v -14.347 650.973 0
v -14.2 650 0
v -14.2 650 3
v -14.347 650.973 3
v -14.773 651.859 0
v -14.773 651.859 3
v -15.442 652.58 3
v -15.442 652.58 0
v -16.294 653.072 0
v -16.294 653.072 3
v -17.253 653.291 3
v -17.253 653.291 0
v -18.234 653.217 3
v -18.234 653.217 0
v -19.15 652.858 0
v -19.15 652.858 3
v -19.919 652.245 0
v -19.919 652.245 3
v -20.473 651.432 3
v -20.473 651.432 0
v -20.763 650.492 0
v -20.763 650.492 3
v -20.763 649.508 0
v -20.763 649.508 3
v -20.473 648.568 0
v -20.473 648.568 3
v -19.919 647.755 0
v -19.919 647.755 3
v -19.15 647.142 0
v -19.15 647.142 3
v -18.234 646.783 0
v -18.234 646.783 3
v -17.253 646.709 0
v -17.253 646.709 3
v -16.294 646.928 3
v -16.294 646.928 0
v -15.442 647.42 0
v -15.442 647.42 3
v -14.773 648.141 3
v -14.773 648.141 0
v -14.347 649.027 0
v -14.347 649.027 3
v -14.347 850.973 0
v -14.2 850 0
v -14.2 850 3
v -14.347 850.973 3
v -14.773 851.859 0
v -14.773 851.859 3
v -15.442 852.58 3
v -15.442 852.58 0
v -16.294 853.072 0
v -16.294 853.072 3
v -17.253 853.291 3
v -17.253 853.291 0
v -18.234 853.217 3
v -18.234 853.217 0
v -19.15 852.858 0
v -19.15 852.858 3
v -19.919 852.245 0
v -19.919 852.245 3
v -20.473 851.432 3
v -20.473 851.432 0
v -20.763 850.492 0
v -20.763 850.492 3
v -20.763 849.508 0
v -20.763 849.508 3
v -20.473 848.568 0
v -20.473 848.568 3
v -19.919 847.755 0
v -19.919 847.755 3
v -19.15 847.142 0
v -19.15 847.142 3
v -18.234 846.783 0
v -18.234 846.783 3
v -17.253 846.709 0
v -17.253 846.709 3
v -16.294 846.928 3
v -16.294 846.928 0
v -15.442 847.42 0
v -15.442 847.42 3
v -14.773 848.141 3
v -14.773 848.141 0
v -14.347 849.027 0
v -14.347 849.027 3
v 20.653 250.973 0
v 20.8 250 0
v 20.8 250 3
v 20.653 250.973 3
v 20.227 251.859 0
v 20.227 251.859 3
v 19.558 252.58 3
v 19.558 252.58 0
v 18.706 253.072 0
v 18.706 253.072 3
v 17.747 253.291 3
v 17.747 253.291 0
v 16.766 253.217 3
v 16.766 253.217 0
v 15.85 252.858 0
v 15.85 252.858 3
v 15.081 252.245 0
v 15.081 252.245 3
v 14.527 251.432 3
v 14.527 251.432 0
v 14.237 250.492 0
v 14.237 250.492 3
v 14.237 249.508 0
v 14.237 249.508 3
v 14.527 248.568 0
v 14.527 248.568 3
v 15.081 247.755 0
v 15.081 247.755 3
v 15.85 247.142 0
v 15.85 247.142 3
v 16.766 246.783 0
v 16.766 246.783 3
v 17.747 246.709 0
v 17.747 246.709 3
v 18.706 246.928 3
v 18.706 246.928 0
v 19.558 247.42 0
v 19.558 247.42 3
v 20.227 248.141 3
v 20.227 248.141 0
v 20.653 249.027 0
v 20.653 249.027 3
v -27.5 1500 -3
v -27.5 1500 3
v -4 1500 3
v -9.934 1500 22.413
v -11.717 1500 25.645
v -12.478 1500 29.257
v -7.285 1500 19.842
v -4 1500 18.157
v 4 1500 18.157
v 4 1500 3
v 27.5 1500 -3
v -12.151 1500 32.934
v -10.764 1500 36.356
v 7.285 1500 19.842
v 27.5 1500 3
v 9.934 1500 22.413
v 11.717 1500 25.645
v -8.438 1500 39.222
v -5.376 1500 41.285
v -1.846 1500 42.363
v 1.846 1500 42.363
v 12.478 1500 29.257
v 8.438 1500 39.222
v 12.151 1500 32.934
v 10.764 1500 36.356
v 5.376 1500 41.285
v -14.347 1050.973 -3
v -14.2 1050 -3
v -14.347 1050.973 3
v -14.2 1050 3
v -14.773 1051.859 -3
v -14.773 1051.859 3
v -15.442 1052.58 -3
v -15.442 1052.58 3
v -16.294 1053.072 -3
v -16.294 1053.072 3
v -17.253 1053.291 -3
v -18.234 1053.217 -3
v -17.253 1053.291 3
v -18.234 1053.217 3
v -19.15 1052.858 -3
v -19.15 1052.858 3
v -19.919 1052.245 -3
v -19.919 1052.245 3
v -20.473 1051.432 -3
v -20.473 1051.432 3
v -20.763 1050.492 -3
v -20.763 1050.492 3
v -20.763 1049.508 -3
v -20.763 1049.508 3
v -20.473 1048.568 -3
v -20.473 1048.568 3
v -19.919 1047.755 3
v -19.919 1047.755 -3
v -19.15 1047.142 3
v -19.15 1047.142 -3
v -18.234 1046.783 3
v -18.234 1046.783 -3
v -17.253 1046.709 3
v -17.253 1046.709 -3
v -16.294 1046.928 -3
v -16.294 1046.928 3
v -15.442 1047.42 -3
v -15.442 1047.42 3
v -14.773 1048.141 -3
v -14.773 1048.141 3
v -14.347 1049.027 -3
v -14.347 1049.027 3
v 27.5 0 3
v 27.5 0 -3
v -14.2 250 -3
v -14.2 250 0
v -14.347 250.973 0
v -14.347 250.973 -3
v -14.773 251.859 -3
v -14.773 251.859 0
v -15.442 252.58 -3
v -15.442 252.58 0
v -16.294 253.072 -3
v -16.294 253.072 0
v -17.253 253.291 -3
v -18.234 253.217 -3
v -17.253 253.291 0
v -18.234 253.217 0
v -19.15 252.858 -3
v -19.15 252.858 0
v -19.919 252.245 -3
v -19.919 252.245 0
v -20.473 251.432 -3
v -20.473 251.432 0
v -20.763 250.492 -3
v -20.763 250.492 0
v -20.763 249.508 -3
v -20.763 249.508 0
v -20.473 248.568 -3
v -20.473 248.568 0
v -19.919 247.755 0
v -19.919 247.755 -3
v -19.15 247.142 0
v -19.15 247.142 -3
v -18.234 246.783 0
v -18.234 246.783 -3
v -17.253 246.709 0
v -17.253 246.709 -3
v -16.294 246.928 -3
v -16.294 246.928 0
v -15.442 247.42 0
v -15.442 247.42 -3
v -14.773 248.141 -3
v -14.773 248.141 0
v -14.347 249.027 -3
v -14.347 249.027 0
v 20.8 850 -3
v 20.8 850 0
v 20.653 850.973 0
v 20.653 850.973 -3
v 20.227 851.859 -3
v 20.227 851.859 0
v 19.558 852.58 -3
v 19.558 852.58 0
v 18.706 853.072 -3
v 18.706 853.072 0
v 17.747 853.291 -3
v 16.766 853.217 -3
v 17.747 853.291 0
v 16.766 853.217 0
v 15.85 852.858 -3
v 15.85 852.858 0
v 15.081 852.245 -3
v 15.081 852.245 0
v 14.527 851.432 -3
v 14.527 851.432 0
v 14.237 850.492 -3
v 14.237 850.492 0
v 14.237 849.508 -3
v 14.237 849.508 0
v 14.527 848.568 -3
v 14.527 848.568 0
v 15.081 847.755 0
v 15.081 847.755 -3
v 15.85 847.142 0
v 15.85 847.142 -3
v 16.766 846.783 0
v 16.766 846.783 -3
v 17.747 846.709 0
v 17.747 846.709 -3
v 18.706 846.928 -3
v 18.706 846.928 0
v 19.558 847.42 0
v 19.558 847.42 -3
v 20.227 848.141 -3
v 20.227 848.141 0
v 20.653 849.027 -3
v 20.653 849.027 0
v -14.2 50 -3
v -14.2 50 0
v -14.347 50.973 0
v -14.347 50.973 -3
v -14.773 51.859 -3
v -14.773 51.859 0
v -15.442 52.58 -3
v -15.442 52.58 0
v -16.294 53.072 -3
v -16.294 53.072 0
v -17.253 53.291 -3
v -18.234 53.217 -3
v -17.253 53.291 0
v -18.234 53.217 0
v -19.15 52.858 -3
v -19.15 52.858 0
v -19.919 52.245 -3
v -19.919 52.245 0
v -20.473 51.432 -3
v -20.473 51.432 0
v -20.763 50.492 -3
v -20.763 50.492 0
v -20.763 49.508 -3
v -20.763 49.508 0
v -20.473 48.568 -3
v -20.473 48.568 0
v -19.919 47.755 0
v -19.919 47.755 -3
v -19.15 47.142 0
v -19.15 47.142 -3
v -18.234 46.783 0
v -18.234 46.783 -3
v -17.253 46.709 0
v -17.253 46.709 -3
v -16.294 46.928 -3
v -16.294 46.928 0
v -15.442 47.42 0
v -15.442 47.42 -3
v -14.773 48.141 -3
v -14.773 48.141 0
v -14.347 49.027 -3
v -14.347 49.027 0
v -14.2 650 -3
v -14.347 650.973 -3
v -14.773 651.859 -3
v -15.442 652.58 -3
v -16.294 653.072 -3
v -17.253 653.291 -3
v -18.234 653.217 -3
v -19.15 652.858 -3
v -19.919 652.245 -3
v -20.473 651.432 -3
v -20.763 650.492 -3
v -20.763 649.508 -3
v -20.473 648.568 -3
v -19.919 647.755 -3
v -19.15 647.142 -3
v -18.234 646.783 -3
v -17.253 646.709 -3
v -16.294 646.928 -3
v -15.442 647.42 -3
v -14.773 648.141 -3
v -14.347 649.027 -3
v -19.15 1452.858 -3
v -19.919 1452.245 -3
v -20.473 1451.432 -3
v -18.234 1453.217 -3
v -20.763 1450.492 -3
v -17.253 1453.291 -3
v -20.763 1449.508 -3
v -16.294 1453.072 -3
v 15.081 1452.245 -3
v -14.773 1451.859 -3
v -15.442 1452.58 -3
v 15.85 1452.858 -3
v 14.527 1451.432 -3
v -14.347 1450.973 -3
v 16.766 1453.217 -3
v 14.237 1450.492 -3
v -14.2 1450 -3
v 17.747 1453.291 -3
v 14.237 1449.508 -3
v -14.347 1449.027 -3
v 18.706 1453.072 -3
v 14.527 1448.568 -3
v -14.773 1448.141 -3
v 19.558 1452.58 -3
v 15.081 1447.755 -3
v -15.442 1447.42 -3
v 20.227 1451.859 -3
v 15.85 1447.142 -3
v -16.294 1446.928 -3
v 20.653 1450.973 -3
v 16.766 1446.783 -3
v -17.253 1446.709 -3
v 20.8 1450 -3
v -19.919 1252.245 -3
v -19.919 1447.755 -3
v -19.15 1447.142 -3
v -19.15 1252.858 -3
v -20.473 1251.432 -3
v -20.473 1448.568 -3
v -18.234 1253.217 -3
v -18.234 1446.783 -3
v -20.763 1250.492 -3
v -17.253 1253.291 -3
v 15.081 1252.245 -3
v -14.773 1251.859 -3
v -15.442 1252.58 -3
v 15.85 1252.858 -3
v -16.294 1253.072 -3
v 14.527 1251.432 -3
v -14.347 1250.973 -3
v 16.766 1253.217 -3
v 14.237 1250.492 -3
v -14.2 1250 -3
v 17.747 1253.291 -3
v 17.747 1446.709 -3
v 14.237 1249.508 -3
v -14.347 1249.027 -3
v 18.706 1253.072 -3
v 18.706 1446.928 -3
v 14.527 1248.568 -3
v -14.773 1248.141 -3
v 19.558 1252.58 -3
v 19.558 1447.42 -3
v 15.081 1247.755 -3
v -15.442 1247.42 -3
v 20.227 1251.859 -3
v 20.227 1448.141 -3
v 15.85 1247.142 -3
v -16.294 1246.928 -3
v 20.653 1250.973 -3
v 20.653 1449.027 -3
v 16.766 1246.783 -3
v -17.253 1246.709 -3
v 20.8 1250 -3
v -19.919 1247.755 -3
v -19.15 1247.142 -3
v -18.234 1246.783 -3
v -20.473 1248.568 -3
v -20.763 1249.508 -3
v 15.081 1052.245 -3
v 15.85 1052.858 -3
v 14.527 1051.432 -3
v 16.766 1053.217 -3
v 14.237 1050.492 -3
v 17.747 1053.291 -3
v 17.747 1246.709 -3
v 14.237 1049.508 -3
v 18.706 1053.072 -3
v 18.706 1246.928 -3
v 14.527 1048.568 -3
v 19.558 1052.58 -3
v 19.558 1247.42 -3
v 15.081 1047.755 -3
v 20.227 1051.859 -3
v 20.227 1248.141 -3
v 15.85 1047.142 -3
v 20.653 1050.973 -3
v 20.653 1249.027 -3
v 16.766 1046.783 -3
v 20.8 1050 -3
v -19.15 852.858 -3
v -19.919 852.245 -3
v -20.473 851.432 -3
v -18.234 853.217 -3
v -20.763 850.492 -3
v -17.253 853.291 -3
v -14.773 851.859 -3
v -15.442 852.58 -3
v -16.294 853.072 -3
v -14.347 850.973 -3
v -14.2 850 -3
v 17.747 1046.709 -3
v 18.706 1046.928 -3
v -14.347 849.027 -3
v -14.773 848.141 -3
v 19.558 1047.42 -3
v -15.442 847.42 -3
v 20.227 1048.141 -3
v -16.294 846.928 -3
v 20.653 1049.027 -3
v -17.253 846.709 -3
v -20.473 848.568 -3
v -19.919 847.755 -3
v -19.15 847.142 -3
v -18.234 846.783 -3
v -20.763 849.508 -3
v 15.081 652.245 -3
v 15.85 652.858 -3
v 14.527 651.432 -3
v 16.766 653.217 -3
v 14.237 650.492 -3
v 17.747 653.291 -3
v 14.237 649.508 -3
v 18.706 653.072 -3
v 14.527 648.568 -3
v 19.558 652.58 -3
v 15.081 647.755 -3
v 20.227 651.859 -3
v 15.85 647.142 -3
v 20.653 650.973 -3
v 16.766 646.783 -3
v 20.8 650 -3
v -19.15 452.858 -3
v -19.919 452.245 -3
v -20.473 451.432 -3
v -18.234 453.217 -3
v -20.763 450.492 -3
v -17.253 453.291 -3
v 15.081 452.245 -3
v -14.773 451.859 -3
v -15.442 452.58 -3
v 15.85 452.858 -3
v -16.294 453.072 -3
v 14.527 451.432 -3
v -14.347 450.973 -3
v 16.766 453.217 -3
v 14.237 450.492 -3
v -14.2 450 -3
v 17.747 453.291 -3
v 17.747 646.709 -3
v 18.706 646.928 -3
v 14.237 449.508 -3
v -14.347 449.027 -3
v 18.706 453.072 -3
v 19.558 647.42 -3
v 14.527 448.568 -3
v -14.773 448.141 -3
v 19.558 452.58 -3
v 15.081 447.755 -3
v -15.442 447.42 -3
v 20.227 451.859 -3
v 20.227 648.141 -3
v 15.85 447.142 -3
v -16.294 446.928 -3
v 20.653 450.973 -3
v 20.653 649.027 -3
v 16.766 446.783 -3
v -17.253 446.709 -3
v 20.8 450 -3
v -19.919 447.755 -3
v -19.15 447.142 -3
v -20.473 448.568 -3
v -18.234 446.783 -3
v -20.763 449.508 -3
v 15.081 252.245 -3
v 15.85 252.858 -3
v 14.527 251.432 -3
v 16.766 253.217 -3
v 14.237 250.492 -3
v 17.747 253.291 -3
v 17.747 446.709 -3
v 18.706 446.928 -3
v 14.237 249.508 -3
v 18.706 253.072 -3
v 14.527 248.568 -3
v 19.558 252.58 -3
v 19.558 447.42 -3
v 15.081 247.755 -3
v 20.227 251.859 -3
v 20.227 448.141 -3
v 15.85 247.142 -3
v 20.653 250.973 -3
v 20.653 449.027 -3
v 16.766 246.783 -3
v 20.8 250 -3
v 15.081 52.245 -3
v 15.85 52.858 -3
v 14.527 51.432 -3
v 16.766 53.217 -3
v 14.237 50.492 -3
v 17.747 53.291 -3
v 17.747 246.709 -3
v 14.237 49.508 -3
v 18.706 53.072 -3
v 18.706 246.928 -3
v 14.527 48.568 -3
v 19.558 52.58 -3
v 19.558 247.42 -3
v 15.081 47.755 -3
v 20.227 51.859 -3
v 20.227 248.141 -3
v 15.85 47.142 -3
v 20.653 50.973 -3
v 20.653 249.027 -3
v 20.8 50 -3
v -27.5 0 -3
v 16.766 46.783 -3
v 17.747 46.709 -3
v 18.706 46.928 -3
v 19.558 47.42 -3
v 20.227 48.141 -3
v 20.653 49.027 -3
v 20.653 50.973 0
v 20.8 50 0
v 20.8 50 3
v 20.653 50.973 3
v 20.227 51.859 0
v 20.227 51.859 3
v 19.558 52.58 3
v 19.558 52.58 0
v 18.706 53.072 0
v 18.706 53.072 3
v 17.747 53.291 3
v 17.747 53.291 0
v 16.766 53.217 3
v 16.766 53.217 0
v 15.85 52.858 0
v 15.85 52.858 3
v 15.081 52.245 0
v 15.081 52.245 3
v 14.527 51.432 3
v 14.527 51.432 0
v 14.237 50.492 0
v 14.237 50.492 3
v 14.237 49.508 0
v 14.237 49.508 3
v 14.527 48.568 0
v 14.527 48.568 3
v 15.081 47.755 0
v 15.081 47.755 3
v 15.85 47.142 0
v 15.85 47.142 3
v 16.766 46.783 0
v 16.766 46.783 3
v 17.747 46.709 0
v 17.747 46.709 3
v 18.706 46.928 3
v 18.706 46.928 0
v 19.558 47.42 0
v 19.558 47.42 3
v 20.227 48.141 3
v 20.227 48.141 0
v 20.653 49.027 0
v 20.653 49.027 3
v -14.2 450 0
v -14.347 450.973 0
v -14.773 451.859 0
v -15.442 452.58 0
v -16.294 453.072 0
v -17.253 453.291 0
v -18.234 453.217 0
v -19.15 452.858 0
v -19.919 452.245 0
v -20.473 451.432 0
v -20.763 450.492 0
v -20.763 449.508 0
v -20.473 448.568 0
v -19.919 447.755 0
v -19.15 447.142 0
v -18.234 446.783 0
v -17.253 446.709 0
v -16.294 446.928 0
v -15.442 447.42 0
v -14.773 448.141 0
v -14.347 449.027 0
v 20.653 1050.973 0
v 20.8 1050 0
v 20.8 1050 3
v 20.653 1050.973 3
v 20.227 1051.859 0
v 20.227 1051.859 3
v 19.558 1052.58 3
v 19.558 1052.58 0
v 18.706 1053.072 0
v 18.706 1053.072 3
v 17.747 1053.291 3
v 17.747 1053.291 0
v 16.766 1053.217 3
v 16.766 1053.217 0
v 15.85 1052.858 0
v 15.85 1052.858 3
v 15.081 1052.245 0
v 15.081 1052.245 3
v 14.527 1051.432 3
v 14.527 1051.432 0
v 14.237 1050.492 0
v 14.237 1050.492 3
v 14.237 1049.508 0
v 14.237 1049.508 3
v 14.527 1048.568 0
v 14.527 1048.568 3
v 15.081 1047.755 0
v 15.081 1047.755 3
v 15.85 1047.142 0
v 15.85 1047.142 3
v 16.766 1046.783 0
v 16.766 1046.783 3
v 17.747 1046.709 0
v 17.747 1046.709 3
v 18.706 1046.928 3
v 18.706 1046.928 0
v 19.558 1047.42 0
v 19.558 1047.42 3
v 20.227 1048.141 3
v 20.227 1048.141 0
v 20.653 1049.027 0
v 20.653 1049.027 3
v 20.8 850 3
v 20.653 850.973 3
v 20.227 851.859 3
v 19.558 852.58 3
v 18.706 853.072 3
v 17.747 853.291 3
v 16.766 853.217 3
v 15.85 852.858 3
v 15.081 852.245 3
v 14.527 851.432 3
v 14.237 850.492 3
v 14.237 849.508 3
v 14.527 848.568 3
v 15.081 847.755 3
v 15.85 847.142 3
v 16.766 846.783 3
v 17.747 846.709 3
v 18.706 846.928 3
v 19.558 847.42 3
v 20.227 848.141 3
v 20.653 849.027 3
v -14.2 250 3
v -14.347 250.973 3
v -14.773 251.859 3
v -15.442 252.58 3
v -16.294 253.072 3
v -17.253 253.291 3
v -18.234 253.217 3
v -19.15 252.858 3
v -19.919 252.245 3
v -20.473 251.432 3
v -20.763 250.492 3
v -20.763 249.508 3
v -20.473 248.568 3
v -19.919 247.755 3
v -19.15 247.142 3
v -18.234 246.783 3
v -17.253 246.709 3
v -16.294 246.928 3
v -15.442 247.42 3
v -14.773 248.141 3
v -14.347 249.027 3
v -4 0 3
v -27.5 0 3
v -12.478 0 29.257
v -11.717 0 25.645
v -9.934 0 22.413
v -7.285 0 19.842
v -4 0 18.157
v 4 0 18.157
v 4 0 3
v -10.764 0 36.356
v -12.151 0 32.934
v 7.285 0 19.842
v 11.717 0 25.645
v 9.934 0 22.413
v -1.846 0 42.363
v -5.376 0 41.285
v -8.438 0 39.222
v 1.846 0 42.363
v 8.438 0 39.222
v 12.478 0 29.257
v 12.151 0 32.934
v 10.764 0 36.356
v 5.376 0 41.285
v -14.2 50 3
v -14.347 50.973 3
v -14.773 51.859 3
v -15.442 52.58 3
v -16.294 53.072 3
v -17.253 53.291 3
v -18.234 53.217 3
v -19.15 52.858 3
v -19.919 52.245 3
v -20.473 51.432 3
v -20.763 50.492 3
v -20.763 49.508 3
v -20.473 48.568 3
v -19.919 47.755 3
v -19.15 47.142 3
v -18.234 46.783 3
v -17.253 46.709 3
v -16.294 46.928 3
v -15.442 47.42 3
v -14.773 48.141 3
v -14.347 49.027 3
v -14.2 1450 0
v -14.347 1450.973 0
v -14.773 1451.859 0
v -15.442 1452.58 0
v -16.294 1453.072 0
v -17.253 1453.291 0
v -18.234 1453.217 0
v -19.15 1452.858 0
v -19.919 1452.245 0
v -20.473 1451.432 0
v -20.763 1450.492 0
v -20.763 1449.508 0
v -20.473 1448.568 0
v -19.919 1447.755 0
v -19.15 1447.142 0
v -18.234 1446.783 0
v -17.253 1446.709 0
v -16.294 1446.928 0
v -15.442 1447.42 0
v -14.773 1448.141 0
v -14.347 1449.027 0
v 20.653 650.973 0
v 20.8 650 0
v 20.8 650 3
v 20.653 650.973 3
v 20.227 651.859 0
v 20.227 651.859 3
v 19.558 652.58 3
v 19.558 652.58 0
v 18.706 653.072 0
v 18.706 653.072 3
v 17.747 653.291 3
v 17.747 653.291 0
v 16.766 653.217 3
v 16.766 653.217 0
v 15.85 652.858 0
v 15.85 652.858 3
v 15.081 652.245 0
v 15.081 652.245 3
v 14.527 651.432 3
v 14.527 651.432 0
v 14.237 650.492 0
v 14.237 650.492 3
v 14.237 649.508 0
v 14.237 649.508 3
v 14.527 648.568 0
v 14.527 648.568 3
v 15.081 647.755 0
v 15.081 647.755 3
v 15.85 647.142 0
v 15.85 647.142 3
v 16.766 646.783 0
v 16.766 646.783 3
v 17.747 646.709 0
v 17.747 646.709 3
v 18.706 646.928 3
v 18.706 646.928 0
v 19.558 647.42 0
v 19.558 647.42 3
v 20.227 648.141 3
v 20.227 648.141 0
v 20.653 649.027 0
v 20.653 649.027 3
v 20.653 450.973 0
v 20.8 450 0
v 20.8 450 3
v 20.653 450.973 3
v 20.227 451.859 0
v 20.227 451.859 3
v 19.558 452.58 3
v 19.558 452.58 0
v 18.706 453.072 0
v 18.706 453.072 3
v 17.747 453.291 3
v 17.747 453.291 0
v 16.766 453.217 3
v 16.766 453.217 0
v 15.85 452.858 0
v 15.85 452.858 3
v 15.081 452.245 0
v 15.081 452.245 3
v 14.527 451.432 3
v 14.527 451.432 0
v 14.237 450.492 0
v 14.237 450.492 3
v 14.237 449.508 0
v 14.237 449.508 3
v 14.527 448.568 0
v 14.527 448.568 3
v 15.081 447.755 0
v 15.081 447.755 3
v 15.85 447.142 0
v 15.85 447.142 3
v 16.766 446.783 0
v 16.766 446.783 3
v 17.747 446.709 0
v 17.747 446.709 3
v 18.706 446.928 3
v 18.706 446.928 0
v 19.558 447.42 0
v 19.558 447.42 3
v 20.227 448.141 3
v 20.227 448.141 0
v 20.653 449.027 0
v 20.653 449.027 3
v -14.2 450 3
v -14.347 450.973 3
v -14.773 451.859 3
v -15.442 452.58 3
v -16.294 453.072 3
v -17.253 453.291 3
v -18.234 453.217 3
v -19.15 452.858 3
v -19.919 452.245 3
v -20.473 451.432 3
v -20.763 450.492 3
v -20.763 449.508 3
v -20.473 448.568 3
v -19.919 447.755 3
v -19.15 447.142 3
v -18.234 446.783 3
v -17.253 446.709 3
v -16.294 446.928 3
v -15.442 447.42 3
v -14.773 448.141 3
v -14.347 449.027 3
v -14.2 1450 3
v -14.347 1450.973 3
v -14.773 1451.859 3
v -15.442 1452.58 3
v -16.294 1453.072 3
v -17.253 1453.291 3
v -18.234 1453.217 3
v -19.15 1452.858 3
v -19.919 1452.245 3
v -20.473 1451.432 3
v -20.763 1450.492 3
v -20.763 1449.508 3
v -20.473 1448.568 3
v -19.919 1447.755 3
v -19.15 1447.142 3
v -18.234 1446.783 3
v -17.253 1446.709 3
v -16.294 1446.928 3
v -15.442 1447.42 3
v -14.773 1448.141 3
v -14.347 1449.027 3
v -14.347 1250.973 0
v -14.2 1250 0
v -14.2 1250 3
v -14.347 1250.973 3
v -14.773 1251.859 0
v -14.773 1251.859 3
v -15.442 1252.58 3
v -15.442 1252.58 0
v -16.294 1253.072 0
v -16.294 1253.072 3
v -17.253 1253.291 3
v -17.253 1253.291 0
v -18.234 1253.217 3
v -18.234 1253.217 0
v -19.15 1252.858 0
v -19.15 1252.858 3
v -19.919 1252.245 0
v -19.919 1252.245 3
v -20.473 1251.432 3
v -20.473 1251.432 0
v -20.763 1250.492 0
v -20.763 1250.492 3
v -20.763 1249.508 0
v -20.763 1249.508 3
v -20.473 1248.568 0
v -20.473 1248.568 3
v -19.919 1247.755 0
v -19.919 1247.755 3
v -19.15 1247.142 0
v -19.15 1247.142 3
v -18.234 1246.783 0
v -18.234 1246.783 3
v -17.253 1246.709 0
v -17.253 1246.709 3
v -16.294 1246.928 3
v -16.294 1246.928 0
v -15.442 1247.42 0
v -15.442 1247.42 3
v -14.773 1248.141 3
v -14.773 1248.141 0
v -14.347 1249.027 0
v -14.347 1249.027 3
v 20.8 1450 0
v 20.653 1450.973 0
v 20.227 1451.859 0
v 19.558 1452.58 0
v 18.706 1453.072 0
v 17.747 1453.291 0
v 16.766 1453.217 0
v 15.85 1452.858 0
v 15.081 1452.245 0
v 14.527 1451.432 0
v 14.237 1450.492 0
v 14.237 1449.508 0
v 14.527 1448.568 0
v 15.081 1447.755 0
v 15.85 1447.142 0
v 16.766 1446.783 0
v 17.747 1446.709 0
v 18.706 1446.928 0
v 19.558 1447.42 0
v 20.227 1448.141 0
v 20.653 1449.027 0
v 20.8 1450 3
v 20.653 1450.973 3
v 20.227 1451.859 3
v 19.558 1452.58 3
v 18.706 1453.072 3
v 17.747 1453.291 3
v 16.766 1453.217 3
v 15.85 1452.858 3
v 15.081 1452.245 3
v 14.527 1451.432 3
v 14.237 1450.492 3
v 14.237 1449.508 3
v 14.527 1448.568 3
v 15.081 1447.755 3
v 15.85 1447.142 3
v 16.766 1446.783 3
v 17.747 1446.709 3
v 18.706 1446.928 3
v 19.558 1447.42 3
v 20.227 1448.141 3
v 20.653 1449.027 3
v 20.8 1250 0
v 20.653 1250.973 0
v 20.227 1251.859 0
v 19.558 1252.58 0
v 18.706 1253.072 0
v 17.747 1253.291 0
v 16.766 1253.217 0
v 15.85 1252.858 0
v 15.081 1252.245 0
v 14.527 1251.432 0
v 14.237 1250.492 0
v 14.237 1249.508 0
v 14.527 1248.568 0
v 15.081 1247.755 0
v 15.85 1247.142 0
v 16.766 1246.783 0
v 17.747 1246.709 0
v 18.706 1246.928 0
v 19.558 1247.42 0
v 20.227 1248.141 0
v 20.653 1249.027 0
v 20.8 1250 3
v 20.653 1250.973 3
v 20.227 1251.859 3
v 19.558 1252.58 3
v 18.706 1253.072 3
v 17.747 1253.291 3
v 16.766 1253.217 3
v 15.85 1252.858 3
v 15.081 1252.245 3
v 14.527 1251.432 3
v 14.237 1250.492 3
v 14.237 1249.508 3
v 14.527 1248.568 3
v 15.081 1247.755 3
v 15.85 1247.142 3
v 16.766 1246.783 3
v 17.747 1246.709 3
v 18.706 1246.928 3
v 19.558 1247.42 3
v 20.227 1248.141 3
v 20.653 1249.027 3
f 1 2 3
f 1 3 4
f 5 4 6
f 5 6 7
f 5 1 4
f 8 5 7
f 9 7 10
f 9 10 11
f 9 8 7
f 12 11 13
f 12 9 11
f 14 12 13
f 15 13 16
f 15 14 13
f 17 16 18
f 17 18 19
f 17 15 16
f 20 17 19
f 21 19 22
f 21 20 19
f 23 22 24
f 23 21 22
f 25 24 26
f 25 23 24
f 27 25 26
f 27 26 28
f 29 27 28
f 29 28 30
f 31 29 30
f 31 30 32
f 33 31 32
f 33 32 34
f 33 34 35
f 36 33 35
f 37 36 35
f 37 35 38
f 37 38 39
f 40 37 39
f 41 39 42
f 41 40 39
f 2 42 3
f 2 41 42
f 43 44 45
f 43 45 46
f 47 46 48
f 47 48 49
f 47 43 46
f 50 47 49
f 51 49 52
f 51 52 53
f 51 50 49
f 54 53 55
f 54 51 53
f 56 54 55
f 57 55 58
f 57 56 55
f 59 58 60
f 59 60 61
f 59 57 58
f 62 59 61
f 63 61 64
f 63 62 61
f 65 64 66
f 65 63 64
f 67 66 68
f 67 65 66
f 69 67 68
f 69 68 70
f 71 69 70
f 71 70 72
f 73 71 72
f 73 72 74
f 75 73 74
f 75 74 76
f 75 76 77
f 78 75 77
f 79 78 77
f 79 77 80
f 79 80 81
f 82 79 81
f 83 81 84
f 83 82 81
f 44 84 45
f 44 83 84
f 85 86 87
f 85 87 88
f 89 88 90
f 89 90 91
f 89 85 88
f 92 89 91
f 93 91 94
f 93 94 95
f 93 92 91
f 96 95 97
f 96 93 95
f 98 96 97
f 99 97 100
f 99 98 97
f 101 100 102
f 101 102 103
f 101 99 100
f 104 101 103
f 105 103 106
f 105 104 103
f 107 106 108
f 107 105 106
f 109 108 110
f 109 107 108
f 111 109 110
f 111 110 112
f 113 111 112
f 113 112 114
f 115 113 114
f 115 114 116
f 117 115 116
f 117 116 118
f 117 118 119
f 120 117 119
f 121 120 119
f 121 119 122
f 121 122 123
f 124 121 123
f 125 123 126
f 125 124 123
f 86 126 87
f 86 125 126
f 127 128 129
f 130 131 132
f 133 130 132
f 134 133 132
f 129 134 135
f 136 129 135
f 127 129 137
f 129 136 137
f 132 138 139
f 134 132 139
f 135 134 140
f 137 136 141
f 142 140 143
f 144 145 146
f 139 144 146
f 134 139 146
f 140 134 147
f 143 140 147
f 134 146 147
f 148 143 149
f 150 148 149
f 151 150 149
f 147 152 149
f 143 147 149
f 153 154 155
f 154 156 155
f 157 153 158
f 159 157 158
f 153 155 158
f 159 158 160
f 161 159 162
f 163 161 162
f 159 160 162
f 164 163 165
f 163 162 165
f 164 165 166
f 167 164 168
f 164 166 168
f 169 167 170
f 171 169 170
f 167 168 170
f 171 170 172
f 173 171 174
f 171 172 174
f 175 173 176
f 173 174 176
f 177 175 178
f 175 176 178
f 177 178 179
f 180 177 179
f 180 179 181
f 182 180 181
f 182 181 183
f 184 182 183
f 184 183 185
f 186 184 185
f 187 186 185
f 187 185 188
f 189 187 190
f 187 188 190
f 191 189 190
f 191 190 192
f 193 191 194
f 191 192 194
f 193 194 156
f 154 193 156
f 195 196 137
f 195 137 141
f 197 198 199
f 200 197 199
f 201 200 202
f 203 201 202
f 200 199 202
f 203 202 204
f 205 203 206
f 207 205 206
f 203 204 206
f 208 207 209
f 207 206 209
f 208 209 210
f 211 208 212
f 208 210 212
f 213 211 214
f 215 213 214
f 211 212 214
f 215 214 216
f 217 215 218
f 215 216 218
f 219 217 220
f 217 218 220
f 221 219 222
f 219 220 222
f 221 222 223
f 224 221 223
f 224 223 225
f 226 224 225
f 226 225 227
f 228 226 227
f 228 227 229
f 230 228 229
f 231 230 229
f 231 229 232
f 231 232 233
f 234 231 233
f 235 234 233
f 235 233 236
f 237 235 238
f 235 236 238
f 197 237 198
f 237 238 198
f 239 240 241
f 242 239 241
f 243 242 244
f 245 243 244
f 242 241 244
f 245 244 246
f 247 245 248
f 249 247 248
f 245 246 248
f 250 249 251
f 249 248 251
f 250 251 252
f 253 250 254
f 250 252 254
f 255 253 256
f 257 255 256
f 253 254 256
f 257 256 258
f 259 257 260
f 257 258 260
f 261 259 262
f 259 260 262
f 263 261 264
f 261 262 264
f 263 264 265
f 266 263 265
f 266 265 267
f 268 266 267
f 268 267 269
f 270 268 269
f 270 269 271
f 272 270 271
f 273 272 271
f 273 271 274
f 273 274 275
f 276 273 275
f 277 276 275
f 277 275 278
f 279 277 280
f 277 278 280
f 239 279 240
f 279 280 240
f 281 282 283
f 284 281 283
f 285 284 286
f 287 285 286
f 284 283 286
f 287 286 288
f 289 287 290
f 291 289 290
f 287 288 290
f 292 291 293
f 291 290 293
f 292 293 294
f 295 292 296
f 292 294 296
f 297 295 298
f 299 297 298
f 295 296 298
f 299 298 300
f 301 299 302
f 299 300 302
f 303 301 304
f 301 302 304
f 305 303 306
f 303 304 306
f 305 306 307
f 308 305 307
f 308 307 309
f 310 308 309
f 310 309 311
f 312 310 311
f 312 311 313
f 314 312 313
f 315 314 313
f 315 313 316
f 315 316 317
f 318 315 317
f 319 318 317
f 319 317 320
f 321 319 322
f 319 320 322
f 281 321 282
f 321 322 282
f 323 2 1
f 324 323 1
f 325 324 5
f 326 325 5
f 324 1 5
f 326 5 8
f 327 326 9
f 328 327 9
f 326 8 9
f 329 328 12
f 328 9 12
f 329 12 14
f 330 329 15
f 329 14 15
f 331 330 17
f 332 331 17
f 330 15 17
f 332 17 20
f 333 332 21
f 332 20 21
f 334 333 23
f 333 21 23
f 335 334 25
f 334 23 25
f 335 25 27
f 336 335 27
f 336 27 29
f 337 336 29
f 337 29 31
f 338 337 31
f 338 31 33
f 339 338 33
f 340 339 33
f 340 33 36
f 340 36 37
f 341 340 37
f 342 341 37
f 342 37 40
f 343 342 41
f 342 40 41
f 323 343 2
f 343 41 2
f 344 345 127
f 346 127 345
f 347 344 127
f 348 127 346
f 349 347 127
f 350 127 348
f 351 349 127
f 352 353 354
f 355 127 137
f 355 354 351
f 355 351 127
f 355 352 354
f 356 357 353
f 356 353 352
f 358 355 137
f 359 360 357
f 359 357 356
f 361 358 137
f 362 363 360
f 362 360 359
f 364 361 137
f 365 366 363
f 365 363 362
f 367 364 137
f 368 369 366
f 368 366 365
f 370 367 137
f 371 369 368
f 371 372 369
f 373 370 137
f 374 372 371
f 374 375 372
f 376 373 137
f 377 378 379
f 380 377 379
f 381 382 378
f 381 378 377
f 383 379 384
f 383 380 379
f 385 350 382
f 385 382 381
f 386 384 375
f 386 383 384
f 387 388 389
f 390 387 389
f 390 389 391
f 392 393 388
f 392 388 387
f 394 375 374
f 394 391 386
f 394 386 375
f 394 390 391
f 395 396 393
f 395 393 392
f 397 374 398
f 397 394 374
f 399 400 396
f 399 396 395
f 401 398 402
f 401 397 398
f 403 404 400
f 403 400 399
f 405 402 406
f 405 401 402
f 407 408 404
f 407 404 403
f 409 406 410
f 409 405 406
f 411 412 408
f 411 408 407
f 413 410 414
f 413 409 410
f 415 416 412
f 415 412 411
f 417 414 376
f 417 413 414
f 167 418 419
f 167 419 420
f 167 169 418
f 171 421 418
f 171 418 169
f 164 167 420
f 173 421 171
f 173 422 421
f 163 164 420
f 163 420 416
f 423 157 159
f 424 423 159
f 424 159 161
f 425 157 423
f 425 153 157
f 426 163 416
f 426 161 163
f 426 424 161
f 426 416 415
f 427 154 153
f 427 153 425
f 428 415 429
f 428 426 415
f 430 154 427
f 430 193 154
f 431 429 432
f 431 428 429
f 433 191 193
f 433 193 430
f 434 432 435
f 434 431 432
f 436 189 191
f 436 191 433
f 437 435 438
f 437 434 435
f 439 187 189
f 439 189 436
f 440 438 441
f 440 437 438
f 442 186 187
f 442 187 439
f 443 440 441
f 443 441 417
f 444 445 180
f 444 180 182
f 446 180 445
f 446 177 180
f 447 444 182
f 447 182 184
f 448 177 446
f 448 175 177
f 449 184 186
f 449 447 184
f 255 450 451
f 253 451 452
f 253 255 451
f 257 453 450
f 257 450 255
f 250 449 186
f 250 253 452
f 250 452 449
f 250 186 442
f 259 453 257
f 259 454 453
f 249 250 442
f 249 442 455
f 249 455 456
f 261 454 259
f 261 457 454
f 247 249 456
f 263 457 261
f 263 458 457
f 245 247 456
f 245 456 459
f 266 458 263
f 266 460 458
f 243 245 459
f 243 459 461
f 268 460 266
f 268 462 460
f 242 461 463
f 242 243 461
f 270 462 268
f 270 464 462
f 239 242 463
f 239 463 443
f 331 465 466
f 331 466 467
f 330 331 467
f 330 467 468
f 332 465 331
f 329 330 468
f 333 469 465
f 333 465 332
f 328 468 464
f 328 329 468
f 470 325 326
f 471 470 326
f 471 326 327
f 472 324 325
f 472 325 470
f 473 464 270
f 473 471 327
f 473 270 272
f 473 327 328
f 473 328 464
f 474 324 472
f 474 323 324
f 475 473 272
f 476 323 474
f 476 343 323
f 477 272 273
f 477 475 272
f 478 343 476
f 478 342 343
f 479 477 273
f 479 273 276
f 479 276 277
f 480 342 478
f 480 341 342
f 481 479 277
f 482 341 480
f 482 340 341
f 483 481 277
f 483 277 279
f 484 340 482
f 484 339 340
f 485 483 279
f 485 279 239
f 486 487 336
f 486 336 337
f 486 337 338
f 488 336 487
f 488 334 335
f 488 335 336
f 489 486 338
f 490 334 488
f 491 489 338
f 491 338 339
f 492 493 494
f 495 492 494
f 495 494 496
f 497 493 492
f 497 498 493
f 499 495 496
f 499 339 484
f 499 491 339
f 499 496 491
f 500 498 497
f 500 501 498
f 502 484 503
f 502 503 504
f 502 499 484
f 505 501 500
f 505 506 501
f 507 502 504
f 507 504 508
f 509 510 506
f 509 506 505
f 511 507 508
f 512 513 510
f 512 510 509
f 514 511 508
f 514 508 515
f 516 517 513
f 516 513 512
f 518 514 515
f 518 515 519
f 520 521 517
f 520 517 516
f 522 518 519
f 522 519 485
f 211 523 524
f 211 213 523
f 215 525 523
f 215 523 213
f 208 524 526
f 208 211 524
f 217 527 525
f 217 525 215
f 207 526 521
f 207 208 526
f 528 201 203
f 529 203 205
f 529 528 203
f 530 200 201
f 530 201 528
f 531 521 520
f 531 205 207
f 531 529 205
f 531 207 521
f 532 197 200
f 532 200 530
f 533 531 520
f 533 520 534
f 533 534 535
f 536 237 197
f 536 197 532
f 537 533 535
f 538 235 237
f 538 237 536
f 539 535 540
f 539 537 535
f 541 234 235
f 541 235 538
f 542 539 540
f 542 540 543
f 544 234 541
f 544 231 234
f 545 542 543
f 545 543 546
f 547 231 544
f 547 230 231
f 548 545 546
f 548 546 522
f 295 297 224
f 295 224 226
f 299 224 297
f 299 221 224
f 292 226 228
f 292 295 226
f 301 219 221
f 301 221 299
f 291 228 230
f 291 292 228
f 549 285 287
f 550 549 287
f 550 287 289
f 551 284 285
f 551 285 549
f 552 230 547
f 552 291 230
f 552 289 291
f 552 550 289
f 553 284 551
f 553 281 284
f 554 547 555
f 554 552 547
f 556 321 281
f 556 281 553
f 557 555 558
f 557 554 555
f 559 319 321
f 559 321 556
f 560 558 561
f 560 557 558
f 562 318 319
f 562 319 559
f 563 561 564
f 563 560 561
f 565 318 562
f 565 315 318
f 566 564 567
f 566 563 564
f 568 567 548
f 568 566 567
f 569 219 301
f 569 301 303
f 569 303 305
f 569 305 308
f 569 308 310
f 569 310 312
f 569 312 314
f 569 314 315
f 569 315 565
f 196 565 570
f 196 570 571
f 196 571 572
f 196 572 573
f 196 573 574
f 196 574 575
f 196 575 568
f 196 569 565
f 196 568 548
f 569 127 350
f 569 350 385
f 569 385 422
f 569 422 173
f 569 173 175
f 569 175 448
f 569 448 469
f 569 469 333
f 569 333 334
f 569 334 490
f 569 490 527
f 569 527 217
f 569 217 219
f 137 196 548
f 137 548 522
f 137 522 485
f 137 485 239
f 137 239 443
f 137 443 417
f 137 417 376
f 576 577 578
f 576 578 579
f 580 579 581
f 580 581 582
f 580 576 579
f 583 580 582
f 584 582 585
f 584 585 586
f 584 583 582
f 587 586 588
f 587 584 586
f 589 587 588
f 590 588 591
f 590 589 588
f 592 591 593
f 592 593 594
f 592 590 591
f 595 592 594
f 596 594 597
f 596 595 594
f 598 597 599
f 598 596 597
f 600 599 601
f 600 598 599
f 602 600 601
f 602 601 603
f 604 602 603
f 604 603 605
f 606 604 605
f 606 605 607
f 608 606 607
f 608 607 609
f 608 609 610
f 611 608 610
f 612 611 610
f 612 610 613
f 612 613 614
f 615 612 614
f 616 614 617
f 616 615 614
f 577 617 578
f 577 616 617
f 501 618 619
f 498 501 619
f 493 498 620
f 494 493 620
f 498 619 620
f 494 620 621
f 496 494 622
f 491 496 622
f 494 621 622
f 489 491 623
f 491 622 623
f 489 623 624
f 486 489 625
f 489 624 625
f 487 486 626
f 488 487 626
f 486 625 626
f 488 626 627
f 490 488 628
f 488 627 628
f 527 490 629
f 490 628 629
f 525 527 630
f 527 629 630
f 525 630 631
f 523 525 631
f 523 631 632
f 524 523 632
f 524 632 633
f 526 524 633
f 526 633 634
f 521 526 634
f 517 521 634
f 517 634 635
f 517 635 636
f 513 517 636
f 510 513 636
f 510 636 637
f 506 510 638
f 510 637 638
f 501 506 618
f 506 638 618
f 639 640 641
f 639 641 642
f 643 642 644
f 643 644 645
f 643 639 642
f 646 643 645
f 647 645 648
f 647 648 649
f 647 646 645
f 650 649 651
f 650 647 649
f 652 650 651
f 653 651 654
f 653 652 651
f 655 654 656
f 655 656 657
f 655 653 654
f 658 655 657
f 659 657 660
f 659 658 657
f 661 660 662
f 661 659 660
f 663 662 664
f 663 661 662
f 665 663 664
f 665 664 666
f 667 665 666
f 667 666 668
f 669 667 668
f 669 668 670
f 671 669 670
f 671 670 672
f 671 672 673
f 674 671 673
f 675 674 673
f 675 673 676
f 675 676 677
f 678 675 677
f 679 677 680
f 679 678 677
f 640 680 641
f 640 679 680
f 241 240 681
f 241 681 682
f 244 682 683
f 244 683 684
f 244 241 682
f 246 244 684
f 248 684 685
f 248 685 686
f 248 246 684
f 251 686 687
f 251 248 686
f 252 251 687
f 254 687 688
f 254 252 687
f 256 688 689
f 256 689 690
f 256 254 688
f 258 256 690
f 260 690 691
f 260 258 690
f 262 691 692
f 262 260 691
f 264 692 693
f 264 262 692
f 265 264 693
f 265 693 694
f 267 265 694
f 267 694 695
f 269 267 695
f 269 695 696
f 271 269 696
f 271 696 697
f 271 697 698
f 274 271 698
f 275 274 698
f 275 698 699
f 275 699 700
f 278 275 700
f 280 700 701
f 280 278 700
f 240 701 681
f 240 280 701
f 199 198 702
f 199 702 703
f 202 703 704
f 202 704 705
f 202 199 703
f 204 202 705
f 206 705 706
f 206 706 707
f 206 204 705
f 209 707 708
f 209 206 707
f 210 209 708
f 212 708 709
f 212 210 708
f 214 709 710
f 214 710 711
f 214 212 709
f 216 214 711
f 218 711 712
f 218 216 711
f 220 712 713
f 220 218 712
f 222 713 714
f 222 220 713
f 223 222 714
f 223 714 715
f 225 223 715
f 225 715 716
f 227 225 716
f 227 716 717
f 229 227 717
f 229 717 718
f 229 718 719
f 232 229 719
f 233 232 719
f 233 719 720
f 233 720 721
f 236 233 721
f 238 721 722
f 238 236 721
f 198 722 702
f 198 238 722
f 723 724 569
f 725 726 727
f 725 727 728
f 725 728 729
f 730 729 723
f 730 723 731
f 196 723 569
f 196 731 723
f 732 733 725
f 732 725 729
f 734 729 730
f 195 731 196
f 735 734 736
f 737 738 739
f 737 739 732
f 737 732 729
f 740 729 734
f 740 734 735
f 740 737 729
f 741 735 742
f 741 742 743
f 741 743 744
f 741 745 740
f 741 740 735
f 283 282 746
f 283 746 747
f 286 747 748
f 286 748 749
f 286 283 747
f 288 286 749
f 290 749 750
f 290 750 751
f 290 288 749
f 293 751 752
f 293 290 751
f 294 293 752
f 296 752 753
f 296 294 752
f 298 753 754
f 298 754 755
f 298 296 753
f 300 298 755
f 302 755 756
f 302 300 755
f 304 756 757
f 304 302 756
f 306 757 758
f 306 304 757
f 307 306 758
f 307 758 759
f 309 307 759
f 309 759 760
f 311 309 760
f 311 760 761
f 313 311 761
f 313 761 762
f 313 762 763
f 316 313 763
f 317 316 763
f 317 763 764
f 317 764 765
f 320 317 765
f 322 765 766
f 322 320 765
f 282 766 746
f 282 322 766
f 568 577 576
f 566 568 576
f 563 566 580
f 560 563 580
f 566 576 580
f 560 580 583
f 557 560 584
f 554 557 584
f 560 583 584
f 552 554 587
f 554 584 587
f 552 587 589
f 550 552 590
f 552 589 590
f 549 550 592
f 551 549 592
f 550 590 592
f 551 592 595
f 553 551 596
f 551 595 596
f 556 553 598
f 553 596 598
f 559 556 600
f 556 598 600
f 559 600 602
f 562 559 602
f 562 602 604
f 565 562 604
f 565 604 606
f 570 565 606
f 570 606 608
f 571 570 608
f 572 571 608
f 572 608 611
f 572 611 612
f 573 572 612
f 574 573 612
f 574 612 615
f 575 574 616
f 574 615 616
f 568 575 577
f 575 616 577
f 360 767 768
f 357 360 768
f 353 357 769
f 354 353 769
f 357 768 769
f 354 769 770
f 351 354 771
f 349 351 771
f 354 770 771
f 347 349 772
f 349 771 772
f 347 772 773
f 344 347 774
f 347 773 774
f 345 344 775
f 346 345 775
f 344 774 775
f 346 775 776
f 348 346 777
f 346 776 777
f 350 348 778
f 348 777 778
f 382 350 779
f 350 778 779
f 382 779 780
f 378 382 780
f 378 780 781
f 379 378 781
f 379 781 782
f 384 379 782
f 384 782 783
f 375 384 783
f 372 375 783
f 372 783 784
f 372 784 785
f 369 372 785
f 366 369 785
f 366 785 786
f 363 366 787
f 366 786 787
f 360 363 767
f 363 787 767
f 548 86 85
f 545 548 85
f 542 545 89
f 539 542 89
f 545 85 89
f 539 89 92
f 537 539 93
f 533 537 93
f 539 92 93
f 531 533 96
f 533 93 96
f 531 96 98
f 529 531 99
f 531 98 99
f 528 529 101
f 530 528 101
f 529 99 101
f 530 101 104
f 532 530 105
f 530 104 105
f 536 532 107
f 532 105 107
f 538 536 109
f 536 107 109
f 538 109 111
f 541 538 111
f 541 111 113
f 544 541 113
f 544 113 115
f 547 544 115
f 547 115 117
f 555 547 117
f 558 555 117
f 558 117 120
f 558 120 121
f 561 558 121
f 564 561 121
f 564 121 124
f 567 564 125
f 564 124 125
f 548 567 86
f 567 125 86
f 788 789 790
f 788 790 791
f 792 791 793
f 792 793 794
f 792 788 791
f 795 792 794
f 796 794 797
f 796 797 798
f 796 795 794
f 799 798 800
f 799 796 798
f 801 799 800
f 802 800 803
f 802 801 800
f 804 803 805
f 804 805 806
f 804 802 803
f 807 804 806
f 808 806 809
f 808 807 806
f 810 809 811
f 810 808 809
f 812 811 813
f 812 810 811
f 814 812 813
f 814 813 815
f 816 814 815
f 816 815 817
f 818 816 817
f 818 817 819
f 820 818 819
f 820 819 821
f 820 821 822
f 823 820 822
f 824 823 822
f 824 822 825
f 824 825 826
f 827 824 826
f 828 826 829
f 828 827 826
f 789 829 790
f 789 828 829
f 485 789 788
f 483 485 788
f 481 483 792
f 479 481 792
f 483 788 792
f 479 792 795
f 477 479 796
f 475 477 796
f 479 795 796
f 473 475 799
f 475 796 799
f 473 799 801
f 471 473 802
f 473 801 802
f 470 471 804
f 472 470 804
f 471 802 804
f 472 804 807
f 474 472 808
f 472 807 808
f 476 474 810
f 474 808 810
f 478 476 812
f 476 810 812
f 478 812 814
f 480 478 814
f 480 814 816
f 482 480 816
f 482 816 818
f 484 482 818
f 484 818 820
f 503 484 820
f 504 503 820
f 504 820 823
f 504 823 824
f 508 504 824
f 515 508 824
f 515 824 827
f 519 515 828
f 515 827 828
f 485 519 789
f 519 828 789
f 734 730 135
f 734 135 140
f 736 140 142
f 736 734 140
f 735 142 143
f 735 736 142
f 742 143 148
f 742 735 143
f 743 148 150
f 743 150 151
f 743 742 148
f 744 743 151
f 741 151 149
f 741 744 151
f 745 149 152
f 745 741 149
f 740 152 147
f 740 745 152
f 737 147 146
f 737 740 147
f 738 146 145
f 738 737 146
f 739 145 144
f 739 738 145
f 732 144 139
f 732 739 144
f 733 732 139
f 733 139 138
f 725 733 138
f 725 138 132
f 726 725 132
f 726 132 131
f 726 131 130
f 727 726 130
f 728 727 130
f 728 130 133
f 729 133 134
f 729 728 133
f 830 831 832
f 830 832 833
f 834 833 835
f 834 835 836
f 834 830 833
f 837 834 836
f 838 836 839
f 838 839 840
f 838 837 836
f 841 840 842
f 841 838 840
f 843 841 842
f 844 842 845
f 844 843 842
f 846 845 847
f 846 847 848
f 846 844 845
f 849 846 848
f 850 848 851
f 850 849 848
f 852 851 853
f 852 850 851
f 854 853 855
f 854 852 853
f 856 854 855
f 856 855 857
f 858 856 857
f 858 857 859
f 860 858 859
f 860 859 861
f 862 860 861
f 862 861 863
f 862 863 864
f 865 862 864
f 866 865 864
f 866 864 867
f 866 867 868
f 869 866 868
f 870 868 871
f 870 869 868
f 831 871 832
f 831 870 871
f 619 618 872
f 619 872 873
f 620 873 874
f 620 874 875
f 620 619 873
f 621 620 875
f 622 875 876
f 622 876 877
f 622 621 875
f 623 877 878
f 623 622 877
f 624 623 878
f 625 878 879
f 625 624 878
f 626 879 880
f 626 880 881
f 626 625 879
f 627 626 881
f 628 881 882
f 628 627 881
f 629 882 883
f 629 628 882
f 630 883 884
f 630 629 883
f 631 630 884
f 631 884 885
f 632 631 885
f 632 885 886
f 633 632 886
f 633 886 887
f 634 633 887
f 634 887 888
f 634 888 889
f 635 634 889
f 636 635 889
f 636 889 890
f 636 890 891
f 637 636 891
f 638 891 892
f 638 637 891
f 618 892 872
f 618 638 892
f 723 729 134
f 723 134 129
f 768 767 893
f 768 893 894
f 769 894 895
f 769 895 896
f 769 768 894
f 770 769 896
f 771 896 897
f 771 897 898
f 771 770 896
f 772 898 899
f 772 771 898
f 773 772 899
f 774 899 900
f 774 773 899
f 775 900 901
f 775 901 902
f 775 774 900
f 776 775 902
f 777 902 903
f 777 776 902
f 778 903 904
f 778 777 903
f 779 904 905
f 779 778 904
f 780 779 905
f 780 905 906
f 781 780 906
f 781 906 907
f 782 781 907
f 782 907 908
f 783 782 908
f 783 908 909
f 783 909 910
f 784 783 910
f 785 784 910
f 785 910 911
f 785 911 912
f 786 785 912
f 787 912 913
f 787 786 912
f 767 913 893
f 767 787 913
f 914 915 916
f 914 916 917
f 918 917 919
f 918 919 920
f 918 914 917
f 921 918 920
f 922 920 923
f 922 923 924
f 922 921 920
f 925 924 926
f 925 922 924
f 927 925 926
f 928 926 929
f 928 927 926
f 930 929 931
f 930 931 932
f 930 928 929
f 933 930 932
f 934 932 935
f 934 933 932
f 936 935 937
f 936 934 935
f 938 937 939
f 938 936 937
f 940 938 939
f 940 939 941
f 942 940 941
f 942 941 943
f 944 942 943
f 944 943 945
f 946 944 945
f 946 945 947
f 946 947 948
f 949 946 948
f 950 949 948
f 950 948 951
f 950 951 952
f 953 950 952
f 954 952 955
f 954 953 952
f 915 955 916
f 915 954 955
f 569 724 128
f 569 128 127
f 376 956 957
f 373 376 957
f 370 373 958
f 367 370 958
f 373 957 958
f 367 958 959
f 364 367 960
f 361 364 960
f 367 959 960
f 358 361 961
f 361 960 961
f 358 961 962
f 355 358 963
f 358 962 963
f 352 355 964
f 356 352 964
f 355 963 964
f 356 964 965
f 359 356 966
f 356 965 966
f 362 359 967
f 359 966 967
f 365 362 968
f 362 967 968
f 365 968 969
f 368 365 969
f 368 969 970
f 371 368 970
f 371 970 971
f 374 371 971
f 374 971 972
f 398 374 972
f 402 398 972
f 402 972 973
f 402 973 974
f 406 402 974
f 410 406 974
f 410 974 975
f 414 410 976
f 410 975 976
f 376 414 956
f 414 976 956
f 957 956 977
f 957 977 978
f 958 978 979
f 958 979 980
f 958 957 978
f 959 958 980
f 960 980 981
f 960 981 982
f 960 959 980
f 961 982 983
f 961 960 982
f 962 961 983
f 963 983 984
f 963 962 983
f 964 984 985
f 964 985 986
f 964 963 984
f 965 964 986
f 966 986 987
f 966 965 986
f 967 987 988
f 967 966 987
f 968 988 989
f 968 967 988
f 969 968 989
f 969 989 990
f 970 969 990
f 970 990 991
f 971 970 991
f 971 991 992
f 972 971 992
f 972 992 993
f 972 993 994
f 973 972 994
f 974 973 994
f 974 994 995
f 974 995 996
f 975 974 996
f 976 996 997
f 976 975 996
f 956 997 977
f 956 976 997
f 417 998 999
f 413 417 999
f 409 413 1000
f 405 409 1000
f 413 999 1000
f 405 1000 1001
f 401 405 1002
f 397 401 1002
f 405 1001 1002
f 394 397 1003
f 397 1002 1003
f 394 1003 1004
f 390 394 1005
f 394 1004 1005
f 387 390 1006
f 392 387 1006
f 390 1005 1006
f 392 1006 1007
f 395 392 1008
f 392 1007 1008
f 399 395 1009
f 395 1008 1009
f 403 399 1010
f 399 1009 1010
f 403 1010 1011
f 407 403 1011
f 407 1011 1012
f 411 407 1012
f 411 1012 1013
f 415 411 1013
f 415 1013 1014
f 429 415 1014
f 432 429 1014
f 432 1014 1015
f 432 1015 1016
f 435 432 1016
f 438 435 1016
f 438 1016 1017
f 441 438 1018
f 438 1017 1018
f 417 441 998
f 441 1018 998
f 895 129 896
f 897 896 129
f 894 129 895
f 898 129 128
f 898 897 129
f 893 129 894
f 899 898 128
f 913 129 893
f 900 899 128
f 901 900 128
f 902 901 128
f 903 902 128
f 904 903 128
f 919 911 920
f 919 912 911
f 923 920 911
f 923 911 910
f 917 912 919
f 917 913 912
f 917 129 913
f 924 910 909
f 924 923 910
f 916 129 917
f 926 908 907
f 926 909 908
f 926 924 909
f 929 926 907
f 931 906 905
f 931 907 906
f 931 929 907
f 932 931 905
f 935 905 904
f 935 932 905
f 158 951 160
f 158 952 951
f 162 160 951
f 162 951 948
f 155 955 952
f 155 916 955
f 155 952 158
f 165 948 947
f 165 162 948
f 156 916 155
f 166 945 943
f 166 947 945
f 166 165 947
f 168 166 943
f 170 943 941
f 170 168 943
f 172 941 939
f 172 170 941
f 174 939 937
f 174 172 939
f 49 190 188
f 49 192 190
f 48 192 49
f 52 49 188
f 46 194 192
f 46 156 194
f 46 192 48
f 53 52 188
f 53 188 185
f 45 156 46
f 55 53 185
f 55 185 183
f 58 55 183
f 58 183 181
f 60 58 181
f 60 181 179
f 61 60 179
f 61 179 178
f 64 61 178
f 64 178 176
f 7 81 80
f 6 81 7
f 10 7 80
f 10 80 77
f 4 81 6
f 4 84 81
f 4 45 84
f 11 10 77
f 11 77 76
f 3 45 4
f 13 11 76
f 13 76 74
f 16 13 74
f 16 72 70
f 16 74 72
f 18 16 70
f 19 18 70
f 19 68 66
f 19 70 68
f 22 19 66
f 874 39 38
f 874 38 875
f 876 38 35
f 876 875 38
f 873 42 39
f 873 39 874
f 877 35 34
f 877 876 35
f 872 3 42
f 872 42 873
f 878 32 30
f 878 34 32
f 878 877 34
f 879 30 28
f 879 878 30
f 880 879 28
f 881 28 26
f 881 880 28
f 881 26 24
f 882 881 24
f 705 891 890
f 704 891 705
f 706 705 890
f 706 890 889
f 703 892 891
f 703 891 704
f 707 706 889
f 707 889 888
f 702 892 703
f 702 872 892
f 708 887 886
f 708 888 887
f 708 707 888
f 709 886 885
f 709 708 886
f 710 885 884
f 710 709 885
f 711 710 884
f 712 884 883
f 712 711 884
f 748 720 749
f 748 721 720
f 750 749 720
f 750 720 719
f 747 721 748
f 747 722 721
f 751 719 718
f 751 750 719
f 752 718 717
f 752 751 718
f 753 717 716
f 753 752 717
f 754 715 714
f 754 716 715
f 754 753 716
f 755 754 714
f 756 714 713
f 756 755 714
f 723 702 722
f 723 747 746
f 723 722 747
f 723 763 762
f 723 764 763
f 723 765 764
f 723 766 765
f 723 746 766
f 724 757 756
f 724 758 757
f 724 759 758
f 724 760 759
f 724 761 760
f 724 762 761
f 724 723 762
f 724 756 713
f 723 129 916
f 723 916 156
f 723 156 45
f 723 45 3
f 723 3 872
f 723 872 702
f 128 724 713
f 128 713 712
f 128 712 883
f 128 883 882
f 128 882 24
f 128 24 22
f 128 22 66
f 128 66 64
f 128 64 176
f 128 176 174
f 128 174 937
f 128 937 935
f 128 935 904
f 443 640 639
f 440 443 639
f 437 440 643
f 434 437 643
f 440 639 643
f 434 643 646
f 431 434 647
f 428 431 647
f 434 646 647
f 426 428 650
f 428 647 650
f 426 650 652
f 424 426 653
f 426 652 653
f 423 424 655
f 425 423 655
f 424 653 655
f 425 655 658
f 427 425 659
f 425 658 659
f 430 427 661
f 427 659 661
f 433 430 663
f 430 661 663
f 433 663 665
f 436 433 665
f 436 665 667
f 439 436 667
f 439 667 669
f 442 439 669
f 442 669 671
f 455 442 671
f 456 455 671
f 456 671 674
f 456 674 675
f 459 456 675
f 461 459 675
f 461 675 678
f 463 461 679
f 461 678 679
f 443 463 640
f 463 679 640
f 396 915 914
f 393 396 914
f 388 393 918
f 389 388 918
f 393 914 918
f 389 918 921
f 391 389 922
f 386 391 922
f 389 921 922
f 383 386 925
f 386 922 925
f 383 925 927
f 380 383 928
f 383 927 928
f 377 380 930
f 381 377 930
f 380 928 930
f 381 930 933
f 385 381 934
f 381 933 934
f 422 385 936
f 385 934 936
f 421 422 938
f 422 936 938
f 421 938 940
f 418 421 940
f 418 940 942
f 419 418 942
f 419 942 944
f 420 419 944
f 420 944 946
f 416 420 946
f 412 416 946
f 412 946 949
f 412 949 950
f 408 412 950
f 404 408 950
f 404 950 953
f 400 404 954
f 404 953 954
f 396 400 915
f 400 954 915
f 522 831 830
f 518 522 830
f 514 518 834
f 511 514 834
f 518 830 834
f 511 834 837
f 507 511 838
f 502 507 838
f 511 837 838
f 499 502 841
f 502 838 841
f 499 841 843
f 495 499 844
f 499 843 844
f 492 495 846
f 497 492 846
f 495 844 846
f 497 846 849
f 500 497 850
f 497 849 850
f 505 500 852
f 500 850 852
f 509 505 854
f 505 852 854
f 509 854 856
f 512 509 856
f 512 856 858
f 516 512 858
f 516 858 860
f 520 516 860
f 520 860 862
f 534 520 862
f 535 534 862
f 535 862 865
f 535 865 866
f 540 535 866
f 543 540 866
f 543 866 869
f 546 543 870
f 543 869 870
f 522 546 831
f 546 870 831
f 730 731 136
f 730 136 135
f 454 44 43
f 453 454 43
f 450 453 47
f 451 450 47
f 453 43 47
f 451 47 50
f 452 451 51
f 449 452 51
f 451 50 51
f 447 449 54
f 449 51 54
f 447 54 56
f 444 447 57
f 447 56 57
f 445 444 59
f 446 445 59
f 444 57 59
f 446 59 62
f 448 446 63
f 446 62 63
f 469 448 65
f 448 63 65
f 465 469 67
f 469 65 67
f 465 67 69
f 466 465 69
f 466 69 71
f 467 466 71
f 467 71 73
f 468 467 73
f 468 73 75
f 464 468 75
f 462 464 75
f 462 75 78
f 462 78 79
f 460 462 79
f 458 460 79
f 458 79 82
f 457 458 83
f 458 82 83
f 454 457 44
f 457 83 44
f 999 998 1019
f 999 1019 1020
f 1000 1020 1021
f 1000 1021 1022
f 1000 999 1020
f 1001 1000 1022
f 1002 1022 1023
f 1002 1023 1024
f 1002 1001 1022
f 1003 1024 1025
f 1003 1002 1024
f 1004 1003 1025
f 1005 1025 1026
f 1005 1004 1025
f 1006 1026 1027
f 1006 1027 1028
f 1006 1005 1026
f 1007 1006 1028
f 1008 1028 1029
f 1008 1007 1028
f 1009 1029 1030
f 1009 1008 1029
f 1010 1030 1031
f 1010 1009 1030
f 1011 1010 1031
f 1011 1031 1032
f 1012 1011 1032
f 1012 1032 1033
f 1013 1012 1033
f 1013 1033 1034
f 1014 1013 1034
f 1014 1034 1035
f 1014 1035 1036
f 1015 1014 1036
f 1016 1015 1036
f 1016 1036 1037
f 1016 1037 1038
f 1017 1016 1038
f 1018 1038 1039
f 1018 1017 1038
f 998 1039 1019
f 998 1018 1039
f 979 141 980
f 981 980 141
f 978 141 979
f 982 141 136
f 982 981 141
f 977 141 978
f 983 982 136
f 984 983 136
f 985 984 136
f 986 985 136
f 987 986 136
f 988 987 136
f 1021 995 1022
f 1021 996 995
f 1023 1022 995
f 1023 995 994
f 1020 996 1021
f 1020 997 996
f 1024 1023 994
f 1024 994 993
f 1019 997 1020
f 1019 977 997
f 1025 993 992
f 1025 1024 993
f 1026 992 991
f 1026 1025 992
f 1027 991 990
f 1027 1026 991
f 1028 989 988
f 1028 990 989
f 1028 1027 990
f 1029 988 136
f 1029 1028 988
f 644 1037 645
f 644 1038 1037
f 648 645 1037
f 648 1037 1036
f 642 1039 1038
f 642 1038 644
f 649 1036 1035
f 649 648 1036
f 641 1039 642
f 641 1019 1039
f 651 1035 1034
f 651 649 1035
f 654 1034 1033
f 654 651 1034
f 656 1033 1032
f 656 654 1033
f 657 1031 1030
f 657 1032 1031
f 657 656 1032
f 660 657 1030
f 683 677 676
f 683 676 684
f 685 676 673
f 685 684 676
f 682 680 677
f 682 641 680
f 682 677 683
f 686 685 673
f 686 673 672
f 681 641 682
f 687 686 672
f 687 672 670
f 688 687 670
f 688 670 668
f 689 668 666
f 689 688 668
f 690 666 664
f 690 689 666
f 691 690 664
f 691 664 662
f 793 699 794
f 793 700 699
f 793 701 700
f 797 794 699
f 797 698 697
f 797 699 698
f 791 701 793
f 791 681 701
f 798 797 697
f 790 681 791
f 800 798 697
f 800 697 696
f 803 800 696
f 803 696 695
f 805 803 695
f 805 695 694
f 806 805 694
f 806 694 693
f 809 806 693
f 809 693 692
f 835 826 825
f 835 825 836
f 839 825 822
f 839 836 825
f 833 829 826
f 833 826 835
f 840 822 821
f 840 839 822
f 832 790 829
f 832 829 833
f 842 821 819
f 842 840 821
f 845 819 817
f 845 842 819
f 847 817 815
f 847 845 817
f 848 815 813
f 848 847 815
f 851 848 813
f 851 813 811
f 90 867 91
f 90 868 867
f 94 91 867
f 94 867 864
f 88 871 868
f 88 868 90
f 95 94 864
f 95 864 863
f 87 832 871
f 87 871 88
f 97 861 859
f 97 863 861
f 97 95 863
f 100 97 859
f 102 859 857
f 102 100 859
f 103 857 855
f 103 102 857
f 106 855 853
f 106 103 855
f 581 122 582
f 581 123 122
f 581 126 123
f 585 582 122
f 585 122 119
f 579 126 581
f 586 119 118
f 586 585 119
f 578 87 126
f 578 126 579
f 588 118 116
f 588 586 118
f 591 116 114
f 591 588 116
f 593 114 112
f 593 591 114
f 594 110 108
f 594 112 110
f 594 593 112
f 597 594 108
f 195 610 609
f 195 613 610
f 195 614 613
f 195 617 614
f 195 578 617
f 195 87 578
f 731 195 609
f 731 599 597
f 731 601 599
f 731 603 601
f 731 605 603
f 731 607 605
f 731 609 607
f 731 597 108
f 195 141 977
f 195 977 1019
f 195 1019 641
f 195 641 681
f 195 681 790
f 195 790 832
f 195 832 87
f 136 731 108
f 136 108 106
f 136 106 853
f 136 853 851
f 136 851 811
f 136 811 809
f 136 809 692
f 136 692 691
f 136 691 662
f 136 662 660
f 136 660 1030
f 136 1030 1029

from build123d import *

# Parameters (mm, degrees)
F2_DEPTH = 1500
F1_R     = 3.3
F3_DEPTH = 3


with BuildPart() as f2:
    # F0 (on Front) → F2 (new body)
    with BuildSketch(Plane.XZ):
        with BuildLine():
            Line((27.5, -3), (27.5, 3))
            Line((27.5, 3), (4, 3))
            Line((4, 3), (4, 18.1572807177))
            ThreePointArc((4, 18.1572807177), (0, 42.5), (-4, 18.1572807177))
            Line((-4, 18.1572807177), (-4, 3))
            Line((-4, 3), (-27.5, 3))
            Line((-27.5, 3), (-27.5, -3))
            Line((-27.5, -3), (27.5, -3))
        make_face()
    extrude(amount=-F2_DEPTH)

    # F1 (on Top) → F3 (cut, symmetric)
    with BuildSketch(Plane.XY):
        with Locations((17.5, 50)):
            Circle(F1_R)
        with Locations((17.5, 250)):
            Circle(F1_R)
        with Locations((17.5, 1050)):
            Circle(F1_R)
        with Locations((17.5, 450)):
            Circle(F1_R)
        with Locations((17.5, 650)):
            Circle(F1_R)
        with Locations((17.5, 850)):
            Circle(F1_R)
        with Locations((17.5, 1250)):
            Circle(F1_R)
        with Locations((17.5, 1450)):
            Circle(F1_R)
        with Locations((-17.5, 50)):
            Circle(F1_R)
        with Locations((-17.5, 250)):
            Circle(F1_R)
        with Locations((-17.5, 450)):
            Circle(F1_R)
        with Locations((-17.5, 650)):
            Circle(F1_R)
        with Locations((-17.5, 850)):
            Circle(F1_R)
        with Locations((-17.5, 1450)):
            Circle(F1_R)
        with Locations((-17.5, 1250)):
            Circle(F1_R)
        with Locations((-17.5, 1050)):
            Circle(F1_R)
    extrude(amount=F3_DEPTH, both=True, mode=Mode.SUBTRACT)


solid = f2.part
